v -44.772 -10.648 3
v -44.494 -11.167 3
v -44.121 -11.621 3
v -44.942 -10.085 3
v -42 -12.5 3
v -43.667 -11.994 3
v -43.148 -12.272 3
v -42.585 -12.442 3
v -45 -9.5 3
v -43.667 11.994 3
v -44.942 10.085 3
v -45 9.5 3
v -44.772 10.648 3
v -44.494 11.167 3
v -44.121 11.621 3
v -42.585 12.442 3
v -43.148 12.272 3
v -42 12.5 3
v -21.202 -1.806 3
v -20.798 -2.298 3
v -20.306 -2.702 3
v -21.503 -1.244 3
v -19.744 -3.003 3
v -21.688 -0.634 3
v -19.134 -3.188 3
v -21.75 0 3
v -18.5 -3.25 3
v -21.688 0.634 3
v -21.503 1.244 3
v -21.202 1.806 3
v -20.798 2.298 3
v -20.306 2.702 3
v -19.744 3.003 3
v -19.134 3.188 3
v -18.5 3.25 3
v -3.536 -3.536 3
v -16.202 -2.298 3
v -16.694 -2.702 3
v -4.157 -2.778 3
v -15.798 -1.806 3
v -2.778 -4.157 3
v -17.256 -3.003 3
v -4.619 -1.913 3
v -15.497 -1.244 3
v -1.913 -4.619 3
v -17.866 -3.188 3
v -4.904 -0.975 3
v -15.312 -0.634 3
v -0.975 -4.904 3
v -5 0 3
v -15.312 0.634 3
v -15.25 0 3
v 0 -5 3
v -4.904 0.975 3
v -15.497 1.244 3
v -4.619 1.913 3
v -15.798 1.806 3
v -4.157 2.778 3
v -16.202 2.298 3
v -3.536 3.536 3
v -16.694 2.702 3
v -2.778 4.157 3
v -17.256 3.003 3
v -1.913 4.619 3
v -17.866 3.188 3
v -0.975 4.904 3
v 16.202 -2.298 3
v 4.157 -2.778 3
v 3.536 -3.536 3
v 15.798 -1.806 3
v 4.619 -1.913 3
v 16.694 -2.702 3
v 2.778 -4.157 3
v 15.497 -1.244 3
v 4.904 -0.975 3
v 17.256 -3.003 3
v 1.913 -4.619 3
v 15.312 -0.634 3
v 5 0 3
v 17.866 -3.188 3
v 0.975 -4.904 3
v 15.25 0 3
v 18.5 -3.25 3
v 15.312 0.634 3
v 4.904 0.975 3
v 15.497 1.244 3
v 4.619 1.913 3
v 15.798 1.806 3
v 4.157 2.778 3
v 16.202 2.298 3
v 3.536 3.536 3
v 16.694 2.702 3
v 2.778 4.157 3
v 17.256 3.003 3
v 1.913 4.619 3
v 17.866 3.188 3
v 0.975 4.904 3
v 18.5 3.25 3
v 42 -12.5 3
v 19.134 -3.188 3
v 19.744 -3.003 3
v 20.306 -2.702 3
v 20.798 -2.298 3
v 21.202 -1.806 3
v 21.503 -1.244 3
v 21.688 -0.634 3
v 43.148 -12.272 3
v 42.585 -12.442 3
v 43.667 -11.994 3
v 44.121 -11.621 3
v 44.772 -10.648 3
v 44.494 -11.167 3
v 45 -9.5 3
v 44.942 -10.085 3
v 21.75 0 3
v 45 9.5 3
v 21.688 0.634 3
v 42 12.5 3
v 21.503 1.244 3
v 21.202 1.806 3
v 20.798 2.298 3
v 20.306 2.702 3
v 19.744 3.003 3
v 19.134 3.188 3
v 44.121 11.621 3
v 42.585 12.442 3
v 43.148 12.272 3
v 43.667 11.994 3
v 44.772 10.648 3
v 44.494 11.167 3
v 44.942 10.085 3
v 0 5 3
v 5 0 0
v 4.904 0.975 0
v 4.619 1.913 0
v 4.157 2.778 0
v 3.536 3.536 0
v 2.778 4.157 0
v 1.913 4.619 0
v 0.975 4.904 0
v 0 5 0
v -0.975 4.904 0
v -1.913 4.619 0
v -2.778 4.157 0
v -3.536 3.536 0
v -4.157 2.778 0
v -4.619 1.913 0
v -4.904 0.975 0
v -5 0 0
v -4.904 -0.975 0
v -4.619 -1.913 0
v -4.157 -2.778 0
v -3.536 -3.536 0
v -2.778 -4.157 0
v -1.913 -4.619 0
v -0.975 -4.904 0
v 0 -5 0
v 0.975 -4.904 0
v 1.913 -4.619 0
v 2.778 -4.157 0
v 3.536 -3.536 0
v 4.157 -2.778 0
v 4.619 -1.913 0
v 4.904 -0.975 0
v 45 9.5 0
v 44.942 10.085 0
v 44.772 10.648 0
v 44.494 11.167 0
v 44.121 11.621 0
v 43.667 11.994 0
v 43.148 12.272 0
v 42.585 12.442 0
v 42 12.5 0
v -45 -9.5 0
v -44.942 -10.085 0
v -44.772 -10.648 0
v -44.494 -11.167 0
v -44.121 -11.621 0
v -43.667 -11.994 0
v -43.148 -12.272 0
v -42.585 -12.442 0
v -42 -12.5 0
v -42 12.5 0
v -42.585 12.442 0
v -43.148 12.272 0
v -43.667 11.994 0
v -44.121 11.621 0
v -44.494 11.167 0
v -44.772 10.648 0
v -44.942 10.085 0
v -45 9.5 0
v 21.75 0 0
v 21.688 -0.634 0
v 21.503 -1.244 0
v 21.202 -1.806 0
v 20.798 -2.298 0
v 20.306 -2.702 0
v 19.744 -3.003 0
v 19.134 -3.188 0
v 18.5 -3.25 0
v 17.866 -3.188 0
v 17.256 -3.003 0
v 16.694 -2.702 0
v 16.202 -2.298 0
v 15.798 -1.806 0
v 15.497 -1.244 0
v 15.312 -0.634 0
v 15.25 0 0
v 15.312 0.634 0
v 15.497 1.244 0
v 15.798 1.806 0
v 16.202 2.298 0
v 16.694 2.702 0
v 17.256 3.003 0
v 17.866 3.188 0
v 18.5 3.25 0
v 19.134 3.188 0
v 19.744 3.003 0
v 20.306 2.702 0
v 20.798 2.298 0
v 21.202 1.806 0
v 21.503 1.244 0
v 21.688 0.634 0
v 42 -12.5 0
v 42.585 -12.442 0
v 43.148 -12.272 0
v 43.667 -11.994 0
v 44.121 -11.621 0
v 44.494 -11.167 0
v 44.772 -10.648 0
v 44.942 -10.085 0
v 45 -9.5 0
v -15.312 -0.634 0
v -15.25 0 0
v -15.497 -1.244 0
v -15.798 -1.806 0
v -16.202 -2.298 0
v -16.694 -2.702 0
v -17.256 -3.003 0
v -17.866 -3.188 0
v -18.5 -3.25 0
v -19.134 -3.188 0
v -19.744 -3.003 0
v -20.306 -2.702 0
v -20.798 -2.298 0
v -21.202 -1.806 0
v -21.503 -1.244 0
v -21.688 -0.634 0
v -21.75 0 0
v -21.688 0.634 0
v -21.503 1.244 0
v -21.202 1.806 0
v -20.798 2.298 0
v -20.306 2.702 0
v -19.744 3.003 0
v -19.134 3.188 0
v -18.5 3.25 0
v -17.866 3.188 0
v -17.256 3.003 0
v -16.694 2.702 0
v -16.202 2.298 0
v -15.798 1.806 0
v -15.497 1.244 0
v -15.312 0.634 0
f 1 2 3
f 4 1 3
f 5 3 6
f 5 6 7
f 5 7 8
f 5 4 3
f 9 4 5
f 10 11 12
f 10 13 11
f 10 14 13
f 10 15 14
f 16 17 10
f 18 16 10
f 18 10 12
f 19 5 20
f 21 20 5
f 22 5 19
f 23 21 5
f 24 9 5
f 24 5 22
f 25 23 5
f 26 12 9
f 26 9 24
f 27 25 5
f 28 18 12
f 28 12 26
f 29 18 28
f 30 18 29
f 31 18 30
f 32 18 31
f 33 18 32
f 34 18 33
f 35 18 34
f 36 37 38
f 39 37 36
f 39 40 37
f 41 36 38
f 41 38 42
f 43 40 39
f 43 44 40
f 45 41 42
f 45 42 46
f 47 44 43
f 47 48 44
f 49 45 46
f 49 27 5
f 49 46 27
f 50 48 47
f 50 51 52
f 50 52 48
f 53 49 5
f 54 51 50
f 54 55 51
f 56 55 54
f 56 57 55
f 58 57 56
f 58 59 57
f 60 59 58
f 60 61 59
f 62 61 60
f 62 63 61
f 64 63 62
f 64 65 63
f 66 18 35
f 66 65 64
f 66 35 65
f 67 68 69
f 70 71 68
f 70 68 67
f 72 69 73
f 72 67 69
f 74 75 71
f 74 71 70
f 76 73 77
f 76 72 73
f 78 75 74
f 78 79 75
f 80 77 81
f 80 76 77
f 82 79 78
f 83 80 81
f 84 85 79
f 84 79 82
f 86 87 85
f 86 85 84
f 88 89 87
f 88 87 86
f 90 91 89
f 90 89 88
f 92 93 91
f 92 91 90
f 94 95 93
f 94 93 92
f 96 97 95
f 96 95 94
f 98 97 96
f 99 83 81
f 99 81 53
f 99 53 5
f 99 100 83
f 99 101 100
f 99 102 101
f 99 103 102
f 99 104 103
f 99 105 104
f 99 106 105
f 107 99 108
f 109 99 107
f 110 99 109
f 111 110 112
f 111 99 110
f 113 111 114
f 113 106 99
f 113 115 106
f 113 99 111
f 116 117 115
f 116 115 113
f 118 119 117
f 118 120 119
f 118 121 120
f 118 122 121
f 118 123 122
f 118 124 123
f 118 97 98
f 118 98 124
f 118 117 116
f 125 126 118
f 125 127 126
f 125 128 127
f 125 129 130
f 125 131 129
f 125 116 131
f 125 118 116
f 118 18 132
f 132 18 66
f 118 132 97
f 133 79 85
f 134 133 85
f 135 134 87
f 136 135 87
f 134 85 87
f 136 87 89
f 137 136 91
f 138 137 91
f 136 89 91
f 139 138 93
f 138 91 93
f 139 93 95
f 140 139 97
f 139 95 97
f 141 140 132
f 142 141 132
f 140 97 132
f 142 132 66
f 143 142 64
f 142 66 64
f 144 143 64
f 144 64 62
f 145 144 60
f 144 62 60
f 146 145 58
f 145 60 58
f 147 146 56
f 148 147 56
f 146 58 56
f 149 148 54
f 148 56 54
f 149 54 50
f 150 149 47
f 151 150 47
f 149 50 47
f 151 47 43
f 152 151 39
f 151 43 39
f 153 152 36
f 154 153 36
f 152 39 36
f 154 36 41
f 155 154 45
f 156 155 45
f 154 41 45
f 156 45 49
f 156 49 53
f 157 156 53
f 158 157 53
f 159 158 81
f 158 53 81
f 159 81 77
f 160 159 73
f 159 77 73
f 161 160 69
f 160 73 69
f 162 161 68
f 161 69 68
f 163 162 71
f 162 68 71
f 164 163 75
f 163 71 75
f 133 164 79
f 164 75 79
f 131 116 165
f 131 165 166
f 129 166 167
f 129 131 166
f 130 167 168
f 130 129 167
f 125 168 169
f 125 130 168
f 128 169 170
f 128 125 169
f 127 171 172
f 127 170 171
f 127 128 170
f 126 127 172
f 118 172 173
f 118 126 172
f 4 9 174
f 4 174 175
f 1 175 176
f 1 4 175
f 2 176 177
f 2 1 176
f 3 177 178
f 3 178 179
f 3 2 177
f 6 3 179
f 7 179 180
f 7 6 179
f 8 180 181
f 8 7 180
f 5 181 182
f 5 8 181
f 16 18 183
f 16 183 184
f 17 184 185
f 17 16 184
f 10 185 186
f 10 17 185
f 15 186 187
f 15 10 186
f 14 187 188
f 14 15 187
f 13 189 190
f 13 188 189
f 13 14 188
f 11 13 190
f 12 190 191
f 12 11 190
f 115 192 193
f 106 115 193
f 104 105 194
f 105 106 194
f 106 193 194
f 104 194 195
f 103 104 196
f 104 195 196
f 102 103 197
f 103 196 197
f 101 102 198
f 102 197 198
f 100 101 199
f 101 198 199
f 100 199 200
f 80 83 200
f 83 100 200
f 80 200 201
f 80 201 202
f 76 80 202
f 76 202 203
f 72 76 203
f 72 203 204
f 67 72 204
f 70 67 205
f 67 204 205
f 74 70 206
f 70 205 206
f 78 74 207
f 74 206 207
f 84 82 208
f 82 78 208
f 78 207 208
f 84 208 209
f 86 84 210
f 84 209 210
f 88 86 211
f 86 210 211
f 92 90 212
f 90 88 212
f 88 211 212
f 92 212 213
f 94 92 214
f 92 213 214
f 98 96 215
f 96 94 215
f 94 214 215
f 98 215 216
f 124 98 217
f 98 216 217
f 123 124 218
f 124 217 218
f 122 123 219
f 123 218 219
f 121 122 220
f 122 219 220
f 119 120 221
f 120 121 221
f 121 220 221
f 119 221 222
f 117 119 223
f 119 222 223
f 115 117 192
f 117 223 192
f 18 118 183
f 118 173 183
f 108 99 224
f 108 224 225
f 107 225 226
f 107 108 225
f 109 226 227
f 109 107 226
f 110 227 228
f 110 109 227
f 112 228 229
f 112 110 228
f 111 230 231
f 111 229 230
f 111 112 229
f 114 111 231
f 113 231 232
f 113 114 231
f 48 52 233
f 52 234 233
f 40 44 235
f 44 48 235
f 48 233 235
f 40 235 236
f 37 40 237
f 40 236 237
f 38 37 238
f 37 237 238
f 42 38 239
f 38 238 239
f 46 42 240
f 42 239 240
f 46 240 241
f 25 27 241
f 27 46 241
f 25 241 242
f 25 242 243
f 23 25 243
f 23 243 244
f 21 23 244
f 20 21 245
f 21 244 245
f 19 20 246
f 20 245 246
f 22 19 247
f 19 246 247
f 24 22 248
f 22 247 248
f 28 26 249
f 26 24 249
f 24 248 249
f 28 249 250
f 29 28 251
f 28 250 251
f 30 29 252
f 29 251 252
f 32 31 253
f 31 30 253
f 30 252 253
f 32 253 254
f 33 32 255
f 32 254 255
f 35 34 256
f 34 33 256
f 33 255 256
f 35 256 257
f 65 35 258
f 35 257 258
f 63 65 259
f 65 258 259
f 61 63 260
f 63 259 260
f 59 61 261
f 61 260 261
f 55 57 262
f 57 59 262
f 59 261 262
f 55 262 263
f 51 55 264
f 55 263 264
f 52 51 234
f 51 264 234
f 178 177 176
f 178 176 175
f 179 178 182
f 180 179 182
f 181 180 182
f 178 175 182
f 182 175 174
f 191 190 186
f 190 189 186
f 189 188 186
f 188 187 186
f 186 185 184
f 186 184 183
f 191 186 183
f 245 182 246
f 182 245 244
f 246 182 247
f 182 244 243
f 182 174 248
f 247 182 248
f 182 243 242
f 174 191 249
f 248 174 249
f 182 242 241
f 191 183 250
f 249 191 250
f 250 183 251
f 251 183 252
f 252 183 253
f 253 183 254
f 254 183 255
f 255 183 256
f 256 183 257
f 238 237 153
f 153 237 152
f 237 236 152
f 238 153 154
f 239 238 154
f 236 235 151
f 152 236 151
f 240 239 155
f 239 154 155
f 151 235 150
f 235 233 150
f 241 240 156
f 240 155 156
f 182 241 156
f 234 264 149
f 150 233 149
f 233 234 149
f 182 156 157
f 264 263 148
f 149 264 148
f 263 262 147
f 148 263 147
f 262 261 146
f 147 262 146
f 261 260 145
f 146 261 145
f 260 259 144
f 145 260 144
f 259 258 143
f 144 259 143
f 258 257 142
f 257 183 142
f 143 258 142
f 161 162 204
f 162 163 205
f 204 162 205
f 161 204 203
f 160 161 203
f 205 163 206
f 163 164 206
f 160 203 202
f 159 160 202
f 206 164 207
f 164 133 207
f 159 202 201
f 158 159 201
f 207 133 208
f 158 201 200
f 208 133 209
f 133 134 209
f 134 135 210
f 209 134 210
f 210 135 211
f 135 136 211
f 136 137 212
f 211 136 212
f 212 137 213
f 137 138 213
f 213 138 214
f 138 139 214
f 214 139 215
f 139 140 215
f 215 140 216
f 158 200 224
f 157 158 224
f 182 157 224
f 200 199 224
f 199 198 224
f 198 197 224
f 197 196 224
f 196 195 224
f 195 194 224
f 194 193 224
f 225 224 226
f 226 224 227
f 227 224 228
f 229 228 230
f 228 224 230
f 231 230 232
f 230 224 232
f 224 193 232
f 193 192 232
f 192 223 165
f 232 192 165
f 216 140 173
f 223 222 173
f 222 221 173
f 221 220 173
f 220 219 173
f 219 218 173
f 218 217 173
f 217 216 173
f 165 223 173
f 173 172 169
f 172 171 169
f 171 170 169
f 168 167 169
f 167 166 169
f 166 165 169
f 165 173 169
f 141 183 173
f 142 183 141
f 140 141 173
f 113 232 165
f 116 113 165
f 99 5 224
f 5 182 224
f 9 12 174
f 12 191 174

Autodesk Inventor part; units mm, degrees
ref_plane "YZ Plane" through (0, 0, 0) normal (1, 0, 0) x (0, 1, 0)
ref_plane "XZ Plane" through (0, 0, 0) normal (0, 1, 0) x (-1, 0, 0)
ref_plane "XY Plane" through (0, 0, 0) normal (0, 0, 1) x (1, 0, 0)
sketch "Sketch1" plane through (0, 0, 0) normal (0, 0, 1) x (1, 0, 0)
  line L0 (-45, -12.5) -> (45, -12.5)
  line L1 (45, -12.5) -> (45, 12.5)
  line L2 (45, 12.5) -> (-45, 12.5)
  line L3 (-45, 12.5) -> (-45, -12.5)
  line L4 (-45, -12.5) -> (45, 12.5) construction
  line L5 (45, -12.5) -> (-45, 12.5) construction
  circle A0 centre (-18.5, 0) radius 3.25
  circle A1 centre (18.5, 0) radius 3.25
  point P0 (0, 0)
  dimension "d0" = 90
  dimension "d1" = 25
  dimension "d2" = 37
  dimension "d3" = 18.5
  dimension "d4" = 6.5
  dimension "d5" = 6.5
  dimension "d8" = 12.5
  dimension "d9" = 12.5
extrude "Extrusion1" add sketch "Sketch1" along normal blind 3
fillet "Fillet1" radius 3 4 edges at (45, 12.5, 1.5) (45, -12.5, 1.5) (-45, 12.5, 1.5) (-45, -12.5, 1.5)
sketch "Sketch2" plane through (0, 0, 3) normal (0, 0, 1) x (1, 0, 0)
  circle A0 centre (0, 0) radius 5
  dimension "d11" = 10
extrude "Extrusion2" cut sketch "Sketch2" against normal blind 10
properties part number "de giu truc Z"
